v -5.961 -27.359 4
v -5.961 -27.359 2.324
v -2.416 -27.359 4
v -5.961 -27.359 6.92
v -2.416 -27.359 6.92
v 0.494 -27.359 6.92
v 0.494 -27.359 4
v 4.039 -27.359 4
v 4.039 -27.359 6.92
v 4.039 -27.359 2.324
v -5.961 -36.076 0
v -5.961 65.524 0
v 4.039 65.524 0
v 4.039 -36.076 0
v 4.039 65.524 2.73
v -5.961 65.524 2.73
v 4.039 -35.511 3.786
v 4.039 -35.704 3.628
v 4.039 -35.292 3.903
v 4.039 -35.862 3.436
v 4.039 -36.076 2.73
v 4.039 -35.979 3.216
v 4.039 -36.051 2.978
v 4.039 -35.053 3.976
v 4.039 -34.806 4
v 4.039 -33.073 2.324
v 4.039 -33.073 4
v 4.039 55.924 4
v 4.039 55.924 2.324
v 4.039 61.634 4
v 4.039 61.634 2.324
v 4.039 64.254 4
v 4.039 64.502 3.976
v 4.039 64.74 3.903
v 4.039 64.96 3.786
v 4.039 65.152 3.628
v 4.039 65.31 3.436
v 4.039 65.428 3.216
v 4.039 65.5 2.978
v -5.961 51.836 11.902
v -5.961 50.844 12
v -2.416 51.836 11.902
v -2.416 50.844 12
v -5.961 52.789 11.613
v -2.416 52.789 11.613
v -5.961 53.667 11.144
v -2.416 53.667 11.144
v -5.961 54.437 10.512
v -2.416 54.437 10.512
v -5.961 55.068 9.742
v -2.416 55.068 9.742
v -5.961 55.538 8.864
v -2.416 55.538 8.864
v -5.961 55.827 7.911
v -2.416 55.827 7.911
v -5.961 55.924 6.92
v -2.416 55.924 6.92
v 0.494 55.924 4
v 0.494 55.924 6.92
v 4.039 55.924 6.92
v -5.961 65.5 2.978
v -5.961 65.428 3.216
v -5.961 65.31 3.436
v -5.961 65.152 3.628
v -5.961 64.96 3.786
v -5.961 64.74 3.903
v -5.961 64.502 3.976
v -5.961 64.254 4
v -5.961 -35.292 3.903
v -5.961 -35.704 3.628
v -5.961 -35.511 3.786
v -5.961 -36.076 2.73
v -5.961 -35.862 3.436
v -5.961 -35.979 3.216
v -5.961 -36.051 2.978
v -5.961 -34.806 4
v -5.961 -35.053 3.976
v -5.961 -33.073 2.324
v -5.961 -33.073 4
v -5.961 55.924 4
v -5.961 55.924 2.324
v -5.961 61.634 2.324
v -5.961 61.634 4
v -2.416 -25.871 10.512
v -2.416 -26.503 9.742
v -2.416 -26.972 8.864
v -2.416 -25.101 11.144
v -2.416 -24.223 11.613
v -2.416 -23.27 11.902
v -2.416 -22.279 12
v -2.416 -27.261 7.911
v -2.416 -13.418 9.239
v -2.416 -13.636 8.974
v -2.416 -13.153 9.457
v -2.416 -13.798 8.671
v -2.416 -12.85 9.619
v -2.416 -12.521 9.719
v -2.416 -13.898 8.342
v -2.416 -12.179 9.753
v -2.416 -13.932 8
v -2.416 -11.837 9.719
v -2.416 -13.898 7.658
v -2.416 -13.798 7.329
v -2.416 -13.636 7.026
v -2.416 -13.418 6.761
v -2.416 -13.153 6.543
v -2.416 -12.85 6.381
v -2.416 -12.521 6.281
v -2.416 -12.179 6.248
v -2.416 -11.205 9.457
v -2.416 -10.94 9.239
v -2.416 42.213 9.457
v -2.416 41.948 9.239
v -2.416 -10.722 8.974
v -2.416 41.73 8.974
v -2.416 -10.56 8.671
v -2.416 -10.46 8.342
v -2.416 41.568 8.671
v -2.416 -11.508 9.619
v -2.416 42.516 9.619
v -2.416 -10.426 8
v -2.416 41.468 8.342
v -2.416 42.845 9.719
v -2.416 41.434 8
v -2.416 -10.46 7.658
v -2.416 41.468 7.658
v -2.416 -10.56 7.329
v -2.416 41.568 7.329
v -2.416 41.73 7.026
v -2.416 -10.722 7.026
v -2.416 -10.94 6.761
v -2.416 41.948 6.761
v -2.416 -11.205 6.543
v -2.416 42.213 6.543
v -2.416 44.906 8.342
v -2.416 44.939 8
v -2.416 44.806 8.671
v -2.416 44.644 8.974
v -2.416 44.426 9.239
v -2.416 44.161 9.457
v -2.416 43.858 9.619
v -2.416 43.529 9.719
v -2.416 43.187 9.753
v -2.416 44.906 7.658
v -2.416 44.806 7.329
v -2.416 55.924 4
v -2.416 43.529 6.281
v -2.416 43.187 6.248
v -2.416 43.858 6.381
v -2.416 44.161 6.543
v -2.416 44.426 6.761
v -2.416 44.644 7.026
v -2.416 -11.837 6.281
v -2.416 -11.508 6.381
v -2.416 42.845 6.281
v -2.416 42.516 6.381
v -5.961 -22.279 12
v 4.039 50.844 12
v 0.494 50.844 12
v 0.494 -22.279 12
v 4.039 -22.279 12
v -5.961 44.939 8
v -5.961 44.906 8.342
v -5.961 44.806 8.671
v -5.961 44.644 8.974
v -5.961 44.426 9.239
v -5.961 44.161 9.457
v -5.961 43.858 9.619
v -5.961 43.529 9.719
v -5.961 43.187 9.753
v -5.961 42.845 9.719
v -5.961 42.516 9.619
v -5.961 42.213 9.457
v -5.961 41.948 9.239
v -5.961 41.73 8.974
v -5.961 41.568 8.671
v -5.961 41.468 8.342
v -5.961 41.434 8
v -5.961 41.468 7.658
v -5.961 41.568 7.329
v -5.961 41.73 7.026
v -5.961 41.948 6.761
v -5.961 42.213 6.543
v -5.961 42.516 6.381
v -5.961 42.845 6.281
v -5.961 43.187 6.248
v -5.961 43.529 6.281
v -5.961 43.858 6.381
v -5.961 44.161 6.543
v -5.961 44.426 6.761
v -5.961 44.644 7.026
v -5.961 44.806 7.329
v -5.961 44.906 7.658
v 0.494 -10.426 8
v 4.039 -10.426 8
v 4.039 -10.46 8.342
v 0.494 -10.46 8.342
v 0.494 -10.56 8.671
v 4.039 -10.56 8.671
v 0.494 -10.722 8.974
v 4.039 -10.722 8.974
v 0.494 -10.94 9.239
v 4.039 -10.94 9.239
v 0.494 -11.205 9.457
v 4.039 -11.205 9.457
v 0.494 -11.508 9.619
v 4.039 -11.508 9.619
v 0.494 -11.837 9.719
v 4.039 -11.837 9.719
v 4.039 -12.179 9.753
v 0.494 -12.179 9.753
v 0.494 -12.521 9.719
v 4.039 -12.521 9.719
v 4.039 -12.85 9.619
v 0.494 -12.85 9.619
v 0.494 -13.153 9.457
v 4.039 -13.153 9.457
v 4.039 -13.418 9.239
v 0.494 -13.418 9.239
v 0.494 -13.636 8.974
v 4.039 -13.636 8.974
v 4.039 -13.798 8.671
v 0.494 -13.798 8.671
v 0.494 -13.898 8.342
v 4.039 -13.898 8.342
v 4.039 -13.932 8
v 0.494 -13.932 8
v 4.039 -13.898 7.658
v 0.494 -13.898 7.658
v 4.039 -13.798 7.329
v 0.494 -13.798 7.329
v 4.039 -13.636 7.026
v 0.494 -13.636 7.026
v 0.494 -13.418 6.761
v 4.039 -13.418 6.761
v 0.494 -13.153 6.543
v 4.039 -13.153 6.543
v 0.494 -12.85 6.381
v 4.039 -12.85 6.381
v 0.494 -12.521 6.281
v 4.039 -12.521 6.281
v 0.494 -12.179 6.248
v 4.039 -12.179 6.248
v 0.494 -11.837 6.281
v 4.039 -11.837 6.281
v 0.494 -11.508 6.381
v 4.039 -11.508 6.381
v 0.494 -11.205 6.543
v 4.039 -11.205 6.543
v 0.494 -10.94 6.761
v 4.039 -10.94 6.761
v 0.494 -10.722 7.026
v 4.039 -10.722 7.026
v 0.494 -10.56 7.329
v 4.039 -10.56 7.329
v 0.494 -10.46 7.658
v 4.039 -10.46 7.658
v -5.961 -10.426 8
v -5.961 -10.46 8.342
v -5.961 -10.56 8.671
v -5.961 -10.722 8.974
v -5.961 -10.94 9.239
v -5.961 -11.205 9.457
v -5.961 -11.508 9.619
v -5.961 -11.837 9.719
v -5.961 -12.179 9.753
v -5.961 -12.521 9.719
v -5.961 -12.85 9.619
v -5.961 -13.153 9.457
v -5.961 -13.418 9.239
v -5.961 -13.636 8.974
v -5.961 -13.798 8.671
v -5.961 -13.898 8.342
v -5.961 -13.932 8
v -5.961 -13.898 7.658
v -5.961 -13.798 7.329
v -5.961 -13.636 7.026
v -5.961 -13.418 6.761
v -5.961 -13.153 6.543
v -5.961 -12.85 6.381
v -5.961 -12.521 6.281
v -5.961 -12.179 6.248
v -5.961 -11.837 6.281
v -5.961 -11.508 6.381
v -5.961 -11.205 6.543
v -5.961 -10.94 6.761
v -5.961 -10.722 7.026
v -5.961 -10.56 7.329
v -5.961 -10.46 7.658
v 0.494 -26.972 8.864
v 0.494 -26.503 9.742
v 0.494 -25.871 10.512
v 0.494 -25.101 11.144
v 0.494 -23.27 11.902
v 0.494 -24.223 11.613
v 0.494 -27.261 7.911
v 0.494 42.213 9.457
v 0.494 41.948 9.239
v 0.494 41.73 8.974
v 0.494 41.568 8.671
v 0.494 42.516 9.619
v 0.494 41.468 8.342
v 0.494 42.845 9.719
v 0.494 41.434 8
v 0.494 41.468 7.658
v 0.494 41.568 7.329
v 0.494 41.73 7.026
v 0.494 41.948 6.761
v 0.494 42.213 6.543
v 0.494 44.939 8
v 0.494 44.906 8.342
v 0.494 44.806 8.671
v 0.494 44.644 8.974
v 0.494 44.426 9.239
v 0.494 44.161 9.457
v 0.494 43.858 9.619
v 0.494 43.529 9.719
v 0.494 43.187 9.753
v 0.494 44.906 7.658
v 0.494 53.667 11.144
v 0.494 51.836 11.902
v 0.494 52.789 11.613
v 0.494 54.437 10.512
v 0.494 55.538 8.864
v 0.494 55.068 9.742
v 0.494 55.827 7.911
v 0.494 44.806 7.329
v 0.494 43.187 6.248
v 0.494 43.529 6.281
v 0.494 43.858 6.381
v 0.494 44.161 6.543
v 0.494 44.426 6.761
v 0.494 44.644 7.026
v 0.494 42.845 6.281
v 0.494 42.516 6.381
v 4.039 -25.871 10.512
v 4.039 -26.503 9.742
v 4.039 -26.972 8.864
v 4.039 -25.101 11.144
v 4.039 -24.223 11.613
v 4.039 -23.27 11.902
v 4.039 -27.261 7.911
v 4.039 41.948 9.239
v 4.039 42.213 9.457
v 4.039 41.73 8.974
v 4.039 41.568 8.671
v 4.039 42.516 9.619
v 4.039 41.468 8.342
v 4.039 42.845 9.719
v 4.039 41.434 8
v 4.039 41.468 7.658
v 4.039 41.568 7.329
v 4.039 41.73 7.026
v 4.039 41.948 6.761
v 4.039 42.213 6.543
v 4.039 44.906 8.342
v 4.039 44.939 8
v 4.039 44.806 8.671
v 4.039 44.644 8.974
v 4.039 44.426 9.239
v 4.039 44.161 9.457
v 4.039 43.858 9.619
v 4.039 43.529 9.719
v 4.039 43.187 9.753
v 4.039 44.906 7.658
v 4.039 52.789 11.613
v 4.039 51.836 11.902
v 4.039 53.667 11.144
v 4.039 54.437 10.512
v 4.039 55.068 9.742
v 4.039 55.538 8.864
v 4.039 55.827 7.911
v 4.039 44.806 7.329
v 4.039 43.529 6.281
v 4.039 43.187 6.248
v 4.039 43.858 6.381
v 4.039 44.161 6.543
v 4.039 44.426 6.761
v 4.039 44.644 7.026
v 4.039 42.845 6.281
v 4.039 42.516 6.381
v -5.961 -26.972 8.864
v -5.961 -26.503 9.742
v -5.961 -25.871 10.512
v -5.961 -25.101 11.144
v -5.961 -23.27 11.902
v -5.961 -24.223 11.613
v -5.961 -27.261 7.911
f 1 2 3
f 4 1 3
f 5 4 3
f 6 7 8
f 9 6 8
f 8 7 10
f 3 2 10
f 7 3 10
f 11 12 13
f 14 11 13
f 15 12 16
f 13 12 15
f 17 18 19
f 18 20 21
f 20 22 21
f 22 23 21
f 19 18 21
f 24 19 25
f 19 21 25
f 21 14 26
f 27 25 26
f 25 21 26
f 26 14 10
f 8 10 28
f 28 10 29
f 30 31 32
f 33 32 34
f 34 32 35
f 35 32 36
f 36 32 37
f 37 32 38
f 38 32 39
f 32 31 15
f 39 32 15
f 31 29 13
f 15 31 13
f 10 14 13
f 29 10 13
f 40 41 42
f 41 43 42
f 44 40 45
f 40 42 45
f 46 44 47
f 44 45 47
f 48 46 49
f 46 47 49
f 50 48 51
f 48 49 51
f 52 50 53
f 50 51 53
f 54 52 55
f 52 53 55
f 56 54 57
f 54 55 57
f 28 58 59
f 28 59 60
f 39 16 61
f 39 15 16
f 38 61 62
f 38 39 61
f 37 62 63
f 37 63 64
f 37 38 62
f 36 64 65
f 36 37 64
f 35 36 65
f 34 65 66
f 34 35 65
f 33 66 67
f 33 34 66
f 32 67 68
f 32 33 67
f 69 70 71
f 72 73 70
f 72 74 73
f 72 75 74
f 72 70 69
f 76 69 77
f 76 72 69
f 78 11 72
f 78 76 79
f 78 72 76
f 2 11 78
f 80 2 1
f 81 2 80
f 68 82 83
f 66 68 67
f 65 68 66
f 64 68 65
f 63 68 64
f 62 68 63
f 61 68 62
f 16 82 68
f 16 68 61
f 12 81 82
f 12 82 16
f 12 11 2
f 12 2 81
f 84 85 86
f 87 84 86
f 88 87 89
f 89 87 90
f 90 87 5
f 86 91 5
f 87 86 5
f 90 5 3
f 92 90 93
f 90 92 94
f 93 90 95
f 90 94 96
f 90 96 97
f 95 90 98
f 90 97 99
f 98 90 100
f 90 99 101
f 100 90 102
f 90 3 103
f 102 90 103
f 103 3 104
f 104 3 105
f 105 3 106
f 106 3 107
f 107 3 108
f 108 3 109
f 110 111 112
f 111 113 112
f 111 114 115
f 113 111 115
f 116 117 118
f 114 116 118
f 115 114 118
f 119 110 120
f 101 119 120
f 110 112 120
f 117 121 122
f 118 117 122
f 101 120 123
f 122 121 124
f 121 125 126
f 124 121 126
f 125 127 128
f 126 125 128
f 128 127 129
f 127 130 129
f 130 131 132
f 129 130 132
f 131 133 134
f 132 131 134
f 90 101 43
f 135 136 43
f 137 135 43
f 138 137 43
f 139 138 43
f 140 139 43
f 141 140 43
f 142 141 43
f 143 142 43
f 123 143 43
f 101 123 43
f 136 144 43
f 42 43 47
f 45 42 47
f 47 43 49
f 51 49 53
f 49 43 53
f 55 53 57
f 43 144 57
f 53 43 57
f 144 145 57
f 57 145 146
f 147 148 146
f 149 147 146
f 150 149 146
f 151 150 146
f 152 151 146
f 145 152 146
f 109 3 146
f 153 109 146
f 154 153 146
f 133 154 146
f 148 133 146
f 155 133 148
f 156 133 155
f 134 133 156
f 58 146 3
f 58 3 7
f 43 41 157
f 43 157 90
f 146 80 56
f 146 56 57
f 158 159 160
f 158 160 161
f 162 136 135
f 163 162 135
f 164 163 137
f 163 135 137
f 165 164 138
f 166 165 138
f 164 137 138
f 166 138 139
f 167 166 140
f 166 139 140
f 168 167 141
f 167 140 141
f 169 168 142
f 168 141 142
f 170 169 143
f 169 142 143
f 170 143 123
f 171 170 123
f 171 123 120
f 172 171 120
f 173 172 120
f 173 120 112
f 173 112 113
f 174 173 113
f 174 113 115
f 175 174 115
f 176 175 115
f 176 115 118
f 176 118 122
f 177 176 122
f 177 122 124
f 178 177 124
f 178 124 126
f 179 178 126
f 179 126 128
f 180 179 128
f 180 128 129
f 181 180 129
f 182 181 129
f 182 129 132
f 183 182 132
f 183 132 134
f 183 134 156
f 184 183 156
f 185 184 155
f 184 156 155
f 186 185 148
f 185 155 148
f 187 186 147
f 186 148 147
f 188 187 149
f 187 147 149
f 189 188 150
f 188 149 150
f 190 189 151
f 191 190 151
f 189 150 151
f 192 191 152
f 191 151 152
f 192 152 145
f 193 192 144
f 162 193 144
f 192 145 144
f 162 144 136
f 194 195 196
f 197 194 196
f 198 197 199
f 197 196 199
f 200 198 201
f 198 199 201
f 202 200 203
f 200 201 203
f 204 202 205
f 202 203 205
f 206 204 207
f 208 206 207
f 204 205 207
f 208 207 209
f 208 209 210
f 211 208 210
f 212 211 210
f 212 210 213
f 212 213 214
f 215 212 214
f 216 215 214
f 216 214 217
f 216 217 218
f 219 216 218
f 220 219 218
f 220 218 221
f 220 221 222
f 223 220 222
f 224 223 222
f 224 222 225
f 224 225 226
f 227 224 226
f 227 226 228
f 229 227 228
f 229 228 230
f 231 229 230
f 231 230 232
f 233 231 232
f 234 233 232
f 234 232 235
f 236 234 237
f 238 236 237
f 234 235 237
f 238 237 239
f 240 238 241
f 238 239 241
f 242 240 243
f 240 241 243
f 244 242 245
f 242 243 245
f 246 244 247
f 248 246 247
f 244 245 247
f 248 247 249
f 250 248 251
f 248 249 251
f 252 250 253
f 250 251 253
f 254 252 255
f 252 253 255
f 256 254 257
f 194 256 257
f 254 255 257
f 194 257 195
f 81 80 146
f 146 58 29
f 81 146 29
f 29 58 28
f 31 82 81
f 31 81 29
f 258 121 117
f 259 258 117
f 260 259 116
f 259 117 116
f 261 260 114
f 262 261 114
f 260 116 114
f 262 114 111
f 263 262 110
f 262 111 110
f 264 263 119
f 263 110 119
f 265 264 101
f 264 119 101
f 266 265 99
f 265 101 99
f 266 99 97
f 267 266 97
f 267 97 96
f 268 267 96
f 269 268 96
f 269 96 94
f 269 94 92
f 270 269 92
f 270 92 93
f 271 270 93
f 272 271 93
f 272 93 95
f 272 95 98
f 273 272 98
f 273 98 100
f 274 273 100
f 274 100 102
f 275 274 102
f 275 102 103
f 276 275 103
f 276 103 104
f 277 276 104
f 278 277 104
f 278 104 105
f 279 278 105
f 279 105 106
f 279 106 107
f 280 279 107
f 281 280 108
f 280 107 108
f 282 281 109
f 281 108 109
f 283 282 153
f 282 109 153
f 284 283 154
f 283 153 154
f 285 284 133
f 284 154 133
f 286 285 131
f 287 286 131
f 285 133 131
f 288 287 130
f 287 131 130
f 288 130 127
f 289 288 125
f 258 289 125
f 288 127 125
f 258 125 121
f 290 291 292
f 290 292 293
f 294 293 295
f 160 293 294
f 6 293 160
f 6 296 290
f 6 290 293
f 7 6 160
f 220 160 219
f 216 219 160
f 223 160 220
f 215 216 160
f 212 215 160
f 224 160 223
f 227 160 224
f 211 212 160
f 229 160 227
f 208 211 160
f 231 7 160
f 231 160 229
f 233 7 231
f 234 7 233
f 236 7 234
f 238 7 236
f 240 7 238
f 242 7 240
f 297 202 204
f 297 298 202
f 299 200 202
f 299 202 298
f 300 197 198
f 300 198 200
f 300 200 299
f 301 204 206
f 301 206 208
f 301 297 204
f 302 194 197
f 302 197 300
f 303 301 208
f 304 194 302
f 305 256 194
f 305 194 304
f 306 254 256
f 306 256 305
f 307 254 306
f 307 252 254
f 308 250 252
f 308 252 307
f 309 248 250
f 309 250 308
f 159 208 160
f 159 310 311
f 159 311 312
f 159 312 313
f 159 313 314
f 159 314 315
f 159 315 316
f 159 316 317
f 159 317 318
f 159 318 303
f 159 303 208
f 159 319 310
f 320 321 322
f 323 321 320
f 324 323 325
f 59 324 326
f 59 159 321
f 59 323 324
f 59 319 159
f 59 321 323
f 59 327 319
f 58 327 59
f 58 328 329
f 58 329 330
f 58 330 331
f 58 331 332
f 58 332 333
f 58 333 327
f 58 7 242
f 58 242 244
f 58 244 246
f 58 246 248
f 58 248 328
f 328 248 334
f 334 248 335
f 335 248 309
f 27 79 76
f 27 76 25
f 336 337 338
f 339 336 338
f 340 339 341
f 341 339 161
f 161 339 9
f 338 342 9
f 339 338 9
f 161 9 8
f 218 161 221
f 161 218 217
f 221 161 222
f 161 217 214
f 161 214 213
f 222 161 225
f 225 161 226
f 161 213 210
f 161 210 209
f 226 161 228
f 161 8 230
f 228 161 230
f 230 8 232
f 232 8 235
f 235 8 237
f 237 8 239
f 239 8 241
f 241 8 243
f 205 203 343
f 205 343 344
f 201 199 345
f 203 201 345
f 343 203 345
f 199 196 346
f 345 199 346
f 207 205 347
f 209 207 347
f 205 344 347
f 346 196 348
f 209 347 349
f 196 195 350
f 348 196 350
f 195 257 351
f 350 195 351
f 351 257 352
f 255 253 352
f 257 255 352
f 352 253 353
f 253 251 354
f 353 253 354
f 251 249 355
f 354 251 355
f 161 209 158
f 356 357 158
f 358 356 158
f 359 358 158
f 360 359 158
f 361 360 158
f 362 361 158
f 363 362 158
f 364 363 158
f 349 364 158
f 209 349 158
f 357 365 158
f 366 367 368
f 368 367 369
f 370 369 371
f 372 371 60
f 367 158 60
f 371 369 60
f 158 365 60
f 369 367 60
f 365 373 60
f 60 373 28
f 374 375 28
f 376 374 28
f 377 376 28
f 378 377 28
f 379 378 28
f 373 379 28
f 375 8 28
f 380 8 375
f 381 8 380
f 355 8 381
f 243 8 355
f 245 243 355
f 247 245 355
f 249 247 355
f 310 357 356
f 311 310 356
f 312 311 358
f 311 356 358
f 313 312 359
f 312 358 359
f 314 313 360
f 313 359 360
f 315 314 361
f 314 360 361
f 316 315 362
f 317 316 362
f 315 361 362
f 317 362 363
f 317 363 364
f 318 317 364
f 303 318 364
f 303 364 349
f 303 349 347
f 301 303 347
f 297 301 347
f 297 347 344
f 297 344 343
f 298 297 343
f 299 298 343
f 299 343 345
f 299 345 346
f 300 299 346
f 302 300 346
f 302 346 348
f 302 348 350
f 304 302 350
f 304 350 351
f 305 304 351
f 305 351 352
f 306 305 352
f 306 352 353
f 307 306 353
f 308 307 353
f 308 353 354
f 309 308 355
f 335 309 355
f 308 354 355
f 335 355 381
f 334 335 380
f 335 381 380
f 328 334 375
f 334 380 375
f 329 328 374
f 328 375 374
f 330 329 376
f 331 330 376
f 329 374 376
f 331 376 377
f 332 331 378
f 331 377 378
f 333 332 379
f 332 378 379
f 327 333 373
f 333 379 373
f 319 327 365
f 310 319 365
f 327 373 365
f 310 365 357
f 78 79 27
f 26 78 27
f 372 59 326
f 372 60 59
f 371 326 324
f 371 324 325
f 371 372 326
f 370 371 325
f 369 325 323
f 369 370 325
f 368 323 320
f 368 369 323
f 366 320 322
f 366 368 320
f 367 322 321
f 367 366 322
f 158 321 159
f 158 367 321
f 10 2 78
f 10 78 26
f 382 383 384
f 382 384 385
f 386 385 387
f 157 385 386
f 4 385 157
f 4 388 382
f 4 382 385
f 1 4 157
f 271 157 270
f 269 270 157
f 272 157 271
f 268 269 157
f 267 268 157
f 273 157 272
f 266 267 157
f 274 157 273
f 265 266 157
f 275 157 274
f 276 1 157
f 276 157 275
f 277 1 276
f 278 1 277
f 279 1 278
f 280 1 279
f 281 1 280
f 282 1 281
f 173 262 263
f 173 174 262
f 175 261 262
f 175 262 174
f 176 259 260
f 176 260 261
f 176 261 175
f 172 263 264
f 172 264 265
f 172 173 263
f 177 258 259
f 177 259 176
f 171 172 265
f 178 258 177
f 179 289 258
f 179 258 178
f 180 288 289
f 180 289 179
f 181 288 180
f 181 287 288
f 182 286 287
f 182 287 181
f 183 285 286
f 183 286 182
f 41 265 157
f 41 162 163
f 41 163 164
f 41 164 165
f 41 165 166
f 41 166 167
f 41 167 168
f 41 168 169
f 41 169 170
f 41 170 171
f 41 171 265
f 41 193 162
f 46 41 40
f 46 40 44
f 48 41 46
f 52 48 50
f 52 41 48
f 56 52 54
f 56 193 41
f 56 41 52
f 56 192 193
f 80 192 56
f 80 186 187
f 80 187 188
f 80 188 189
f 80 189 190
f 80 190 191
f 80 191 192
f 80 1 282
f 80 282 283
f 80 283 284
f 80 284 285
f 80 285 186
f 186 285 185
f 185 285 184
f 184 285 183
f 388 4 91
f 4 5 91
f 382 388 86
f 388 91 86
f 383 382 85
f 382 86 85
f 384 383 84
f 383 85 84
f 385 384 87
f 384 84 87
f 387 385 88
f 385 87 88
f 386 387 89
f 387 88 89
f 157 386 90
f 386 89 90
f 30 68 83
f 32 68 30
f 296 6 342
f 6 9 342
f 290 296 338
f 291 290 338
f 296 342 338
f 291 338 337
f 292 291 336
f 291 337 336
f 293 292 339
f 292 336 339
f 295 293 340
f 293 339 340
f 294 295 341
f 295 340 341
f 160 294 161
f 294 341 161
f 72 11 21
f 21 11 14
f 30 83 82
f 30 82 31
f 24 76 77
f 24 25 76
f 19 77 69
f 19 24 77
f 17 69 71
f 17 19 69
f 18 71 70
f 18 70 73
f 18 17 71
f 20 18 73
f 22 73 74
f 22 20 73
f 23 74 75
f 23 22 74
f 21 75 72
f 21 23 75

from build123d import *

# Parameters (mm, degrees)
F0_W     = 10.000005
F0_H     = 101.6
F1_DEPTH = 3.999992
F2_W     = 3.545
F2_H     = 83.283524
F3_DEPTH = 8.000009
F4_W     = 10.000005
F4_H     = 5.709733
F4_H_2   = 5.71377
F5_DEPTH = 1.6764
F6_DEPTH = 1.6764
F7_R     = 1.7526
F8_DEPTH = 25.4
F9_R     = 5.08
F10_R    = 5.08
F11_R    = 1.27
F12_R    = 5.08
F13_R    = 5.08
F14_R    = 1.27


with BuildPart() as f1:
    # F0 (on Top) → F1 (new body)
    with BuildSketch(Plane.XY):
        with Locations((-0.961494, 14.724417)):
            Rectangle(F0_W, F0_H)
    extrude(amount=F1_DEPTH)

    # F2 (on face) → F3 (join)
    with BuildSketch(Plane.XY.offset(3.999992)):
        with Locations((2.266009, 14.282725)):
            Rectangle(F2_W, F2_H)
        with Locations((-4.188996, 14.282725)):
            Rectangle(F2_W, F2_H)
    extrude(amount=F3_DEPTH)

    # F4 (on face) → F5 (cut)
    with BuildSketch(Plane.XY.offset(3.999992)):
        with Locations((-0.961494, 58.779353)):
            Rectangle(F4_W, F4_H)
        with Locations((-0.961494, -30.215922)):
            Rectangle(F4_W, F4_H_2)
    extrude(amount=-F5_DEPTH, mode=Mode.SUBTRACT)

    # F4 (on face) → F6 (cut)
    with BuildSketch(Plane.XY.offset(3.999992)):
        with Locations((-0.961494, 58.779353)):
            Rectangle(F4_W, F4_H)
        with Locations((-0.961494, -30.215922)):
            Rectangle(F4_W, F4_H_2)
    extrude(amount=-F6_DEPTH, mode=Mode.SUBTRACT)

    # F7 (on face) → F8 (cut)
    with BuildSketch(Plane.YZ.offset(4.038509)):
        with Locations((-12.17894, 8.000104)):
            Circle(F7_R)
        with Locations((43.18684, 8.000104)):
            Circle(F7_R)
    extrude(amount=-F8_DEPTH, mode=Mode.SUBTRACT)

    # F9
    f9_edges = [f1.edges().sort_by_distance(p)[0] for p in [
        (-4.188996, -27.359037, 12.000001),
    ]]
    fillet(f9_edges, radius=F9_R)

    # F10
    f10_edges = [f1.edges().sort_by_distance(p)[0] for p in [
        (2.266009, -27.359037, 12.000001),
    ]]
    fillet(f10_edges, radius=F10_R)

    # F11
    f11_edges = [f1.edges().sort_by_distance(p)[0] for p in [
        (-0.961494, -36.075583, 3.999992),
    ]]
    fillet(f11_edges, radius=F11_R)

    # F12
    f12_edges = [f1.edges().sort_by_distance(p)[0] for p in [
        (2.266009, 55.924487, 12.000001),
    ]]
    fillet(f12_edges, radius=F12_R)

    # F13
    f13_edges = [f1.edges().sort_by_distance(p)[0] for p in [
        (-4.188996, 55.924487, 12.000001),
    ]]
    fillet(f13_edges, radius=F13_R)

    # F14
    f14_edges = [f1.edges().sort_by_distance(p)[0] for p in [
        (-0.961494, 65.524417, 3.999992),
    ]]
    fillet(f14_edges, radius=F14_R)


solid = f1.part
